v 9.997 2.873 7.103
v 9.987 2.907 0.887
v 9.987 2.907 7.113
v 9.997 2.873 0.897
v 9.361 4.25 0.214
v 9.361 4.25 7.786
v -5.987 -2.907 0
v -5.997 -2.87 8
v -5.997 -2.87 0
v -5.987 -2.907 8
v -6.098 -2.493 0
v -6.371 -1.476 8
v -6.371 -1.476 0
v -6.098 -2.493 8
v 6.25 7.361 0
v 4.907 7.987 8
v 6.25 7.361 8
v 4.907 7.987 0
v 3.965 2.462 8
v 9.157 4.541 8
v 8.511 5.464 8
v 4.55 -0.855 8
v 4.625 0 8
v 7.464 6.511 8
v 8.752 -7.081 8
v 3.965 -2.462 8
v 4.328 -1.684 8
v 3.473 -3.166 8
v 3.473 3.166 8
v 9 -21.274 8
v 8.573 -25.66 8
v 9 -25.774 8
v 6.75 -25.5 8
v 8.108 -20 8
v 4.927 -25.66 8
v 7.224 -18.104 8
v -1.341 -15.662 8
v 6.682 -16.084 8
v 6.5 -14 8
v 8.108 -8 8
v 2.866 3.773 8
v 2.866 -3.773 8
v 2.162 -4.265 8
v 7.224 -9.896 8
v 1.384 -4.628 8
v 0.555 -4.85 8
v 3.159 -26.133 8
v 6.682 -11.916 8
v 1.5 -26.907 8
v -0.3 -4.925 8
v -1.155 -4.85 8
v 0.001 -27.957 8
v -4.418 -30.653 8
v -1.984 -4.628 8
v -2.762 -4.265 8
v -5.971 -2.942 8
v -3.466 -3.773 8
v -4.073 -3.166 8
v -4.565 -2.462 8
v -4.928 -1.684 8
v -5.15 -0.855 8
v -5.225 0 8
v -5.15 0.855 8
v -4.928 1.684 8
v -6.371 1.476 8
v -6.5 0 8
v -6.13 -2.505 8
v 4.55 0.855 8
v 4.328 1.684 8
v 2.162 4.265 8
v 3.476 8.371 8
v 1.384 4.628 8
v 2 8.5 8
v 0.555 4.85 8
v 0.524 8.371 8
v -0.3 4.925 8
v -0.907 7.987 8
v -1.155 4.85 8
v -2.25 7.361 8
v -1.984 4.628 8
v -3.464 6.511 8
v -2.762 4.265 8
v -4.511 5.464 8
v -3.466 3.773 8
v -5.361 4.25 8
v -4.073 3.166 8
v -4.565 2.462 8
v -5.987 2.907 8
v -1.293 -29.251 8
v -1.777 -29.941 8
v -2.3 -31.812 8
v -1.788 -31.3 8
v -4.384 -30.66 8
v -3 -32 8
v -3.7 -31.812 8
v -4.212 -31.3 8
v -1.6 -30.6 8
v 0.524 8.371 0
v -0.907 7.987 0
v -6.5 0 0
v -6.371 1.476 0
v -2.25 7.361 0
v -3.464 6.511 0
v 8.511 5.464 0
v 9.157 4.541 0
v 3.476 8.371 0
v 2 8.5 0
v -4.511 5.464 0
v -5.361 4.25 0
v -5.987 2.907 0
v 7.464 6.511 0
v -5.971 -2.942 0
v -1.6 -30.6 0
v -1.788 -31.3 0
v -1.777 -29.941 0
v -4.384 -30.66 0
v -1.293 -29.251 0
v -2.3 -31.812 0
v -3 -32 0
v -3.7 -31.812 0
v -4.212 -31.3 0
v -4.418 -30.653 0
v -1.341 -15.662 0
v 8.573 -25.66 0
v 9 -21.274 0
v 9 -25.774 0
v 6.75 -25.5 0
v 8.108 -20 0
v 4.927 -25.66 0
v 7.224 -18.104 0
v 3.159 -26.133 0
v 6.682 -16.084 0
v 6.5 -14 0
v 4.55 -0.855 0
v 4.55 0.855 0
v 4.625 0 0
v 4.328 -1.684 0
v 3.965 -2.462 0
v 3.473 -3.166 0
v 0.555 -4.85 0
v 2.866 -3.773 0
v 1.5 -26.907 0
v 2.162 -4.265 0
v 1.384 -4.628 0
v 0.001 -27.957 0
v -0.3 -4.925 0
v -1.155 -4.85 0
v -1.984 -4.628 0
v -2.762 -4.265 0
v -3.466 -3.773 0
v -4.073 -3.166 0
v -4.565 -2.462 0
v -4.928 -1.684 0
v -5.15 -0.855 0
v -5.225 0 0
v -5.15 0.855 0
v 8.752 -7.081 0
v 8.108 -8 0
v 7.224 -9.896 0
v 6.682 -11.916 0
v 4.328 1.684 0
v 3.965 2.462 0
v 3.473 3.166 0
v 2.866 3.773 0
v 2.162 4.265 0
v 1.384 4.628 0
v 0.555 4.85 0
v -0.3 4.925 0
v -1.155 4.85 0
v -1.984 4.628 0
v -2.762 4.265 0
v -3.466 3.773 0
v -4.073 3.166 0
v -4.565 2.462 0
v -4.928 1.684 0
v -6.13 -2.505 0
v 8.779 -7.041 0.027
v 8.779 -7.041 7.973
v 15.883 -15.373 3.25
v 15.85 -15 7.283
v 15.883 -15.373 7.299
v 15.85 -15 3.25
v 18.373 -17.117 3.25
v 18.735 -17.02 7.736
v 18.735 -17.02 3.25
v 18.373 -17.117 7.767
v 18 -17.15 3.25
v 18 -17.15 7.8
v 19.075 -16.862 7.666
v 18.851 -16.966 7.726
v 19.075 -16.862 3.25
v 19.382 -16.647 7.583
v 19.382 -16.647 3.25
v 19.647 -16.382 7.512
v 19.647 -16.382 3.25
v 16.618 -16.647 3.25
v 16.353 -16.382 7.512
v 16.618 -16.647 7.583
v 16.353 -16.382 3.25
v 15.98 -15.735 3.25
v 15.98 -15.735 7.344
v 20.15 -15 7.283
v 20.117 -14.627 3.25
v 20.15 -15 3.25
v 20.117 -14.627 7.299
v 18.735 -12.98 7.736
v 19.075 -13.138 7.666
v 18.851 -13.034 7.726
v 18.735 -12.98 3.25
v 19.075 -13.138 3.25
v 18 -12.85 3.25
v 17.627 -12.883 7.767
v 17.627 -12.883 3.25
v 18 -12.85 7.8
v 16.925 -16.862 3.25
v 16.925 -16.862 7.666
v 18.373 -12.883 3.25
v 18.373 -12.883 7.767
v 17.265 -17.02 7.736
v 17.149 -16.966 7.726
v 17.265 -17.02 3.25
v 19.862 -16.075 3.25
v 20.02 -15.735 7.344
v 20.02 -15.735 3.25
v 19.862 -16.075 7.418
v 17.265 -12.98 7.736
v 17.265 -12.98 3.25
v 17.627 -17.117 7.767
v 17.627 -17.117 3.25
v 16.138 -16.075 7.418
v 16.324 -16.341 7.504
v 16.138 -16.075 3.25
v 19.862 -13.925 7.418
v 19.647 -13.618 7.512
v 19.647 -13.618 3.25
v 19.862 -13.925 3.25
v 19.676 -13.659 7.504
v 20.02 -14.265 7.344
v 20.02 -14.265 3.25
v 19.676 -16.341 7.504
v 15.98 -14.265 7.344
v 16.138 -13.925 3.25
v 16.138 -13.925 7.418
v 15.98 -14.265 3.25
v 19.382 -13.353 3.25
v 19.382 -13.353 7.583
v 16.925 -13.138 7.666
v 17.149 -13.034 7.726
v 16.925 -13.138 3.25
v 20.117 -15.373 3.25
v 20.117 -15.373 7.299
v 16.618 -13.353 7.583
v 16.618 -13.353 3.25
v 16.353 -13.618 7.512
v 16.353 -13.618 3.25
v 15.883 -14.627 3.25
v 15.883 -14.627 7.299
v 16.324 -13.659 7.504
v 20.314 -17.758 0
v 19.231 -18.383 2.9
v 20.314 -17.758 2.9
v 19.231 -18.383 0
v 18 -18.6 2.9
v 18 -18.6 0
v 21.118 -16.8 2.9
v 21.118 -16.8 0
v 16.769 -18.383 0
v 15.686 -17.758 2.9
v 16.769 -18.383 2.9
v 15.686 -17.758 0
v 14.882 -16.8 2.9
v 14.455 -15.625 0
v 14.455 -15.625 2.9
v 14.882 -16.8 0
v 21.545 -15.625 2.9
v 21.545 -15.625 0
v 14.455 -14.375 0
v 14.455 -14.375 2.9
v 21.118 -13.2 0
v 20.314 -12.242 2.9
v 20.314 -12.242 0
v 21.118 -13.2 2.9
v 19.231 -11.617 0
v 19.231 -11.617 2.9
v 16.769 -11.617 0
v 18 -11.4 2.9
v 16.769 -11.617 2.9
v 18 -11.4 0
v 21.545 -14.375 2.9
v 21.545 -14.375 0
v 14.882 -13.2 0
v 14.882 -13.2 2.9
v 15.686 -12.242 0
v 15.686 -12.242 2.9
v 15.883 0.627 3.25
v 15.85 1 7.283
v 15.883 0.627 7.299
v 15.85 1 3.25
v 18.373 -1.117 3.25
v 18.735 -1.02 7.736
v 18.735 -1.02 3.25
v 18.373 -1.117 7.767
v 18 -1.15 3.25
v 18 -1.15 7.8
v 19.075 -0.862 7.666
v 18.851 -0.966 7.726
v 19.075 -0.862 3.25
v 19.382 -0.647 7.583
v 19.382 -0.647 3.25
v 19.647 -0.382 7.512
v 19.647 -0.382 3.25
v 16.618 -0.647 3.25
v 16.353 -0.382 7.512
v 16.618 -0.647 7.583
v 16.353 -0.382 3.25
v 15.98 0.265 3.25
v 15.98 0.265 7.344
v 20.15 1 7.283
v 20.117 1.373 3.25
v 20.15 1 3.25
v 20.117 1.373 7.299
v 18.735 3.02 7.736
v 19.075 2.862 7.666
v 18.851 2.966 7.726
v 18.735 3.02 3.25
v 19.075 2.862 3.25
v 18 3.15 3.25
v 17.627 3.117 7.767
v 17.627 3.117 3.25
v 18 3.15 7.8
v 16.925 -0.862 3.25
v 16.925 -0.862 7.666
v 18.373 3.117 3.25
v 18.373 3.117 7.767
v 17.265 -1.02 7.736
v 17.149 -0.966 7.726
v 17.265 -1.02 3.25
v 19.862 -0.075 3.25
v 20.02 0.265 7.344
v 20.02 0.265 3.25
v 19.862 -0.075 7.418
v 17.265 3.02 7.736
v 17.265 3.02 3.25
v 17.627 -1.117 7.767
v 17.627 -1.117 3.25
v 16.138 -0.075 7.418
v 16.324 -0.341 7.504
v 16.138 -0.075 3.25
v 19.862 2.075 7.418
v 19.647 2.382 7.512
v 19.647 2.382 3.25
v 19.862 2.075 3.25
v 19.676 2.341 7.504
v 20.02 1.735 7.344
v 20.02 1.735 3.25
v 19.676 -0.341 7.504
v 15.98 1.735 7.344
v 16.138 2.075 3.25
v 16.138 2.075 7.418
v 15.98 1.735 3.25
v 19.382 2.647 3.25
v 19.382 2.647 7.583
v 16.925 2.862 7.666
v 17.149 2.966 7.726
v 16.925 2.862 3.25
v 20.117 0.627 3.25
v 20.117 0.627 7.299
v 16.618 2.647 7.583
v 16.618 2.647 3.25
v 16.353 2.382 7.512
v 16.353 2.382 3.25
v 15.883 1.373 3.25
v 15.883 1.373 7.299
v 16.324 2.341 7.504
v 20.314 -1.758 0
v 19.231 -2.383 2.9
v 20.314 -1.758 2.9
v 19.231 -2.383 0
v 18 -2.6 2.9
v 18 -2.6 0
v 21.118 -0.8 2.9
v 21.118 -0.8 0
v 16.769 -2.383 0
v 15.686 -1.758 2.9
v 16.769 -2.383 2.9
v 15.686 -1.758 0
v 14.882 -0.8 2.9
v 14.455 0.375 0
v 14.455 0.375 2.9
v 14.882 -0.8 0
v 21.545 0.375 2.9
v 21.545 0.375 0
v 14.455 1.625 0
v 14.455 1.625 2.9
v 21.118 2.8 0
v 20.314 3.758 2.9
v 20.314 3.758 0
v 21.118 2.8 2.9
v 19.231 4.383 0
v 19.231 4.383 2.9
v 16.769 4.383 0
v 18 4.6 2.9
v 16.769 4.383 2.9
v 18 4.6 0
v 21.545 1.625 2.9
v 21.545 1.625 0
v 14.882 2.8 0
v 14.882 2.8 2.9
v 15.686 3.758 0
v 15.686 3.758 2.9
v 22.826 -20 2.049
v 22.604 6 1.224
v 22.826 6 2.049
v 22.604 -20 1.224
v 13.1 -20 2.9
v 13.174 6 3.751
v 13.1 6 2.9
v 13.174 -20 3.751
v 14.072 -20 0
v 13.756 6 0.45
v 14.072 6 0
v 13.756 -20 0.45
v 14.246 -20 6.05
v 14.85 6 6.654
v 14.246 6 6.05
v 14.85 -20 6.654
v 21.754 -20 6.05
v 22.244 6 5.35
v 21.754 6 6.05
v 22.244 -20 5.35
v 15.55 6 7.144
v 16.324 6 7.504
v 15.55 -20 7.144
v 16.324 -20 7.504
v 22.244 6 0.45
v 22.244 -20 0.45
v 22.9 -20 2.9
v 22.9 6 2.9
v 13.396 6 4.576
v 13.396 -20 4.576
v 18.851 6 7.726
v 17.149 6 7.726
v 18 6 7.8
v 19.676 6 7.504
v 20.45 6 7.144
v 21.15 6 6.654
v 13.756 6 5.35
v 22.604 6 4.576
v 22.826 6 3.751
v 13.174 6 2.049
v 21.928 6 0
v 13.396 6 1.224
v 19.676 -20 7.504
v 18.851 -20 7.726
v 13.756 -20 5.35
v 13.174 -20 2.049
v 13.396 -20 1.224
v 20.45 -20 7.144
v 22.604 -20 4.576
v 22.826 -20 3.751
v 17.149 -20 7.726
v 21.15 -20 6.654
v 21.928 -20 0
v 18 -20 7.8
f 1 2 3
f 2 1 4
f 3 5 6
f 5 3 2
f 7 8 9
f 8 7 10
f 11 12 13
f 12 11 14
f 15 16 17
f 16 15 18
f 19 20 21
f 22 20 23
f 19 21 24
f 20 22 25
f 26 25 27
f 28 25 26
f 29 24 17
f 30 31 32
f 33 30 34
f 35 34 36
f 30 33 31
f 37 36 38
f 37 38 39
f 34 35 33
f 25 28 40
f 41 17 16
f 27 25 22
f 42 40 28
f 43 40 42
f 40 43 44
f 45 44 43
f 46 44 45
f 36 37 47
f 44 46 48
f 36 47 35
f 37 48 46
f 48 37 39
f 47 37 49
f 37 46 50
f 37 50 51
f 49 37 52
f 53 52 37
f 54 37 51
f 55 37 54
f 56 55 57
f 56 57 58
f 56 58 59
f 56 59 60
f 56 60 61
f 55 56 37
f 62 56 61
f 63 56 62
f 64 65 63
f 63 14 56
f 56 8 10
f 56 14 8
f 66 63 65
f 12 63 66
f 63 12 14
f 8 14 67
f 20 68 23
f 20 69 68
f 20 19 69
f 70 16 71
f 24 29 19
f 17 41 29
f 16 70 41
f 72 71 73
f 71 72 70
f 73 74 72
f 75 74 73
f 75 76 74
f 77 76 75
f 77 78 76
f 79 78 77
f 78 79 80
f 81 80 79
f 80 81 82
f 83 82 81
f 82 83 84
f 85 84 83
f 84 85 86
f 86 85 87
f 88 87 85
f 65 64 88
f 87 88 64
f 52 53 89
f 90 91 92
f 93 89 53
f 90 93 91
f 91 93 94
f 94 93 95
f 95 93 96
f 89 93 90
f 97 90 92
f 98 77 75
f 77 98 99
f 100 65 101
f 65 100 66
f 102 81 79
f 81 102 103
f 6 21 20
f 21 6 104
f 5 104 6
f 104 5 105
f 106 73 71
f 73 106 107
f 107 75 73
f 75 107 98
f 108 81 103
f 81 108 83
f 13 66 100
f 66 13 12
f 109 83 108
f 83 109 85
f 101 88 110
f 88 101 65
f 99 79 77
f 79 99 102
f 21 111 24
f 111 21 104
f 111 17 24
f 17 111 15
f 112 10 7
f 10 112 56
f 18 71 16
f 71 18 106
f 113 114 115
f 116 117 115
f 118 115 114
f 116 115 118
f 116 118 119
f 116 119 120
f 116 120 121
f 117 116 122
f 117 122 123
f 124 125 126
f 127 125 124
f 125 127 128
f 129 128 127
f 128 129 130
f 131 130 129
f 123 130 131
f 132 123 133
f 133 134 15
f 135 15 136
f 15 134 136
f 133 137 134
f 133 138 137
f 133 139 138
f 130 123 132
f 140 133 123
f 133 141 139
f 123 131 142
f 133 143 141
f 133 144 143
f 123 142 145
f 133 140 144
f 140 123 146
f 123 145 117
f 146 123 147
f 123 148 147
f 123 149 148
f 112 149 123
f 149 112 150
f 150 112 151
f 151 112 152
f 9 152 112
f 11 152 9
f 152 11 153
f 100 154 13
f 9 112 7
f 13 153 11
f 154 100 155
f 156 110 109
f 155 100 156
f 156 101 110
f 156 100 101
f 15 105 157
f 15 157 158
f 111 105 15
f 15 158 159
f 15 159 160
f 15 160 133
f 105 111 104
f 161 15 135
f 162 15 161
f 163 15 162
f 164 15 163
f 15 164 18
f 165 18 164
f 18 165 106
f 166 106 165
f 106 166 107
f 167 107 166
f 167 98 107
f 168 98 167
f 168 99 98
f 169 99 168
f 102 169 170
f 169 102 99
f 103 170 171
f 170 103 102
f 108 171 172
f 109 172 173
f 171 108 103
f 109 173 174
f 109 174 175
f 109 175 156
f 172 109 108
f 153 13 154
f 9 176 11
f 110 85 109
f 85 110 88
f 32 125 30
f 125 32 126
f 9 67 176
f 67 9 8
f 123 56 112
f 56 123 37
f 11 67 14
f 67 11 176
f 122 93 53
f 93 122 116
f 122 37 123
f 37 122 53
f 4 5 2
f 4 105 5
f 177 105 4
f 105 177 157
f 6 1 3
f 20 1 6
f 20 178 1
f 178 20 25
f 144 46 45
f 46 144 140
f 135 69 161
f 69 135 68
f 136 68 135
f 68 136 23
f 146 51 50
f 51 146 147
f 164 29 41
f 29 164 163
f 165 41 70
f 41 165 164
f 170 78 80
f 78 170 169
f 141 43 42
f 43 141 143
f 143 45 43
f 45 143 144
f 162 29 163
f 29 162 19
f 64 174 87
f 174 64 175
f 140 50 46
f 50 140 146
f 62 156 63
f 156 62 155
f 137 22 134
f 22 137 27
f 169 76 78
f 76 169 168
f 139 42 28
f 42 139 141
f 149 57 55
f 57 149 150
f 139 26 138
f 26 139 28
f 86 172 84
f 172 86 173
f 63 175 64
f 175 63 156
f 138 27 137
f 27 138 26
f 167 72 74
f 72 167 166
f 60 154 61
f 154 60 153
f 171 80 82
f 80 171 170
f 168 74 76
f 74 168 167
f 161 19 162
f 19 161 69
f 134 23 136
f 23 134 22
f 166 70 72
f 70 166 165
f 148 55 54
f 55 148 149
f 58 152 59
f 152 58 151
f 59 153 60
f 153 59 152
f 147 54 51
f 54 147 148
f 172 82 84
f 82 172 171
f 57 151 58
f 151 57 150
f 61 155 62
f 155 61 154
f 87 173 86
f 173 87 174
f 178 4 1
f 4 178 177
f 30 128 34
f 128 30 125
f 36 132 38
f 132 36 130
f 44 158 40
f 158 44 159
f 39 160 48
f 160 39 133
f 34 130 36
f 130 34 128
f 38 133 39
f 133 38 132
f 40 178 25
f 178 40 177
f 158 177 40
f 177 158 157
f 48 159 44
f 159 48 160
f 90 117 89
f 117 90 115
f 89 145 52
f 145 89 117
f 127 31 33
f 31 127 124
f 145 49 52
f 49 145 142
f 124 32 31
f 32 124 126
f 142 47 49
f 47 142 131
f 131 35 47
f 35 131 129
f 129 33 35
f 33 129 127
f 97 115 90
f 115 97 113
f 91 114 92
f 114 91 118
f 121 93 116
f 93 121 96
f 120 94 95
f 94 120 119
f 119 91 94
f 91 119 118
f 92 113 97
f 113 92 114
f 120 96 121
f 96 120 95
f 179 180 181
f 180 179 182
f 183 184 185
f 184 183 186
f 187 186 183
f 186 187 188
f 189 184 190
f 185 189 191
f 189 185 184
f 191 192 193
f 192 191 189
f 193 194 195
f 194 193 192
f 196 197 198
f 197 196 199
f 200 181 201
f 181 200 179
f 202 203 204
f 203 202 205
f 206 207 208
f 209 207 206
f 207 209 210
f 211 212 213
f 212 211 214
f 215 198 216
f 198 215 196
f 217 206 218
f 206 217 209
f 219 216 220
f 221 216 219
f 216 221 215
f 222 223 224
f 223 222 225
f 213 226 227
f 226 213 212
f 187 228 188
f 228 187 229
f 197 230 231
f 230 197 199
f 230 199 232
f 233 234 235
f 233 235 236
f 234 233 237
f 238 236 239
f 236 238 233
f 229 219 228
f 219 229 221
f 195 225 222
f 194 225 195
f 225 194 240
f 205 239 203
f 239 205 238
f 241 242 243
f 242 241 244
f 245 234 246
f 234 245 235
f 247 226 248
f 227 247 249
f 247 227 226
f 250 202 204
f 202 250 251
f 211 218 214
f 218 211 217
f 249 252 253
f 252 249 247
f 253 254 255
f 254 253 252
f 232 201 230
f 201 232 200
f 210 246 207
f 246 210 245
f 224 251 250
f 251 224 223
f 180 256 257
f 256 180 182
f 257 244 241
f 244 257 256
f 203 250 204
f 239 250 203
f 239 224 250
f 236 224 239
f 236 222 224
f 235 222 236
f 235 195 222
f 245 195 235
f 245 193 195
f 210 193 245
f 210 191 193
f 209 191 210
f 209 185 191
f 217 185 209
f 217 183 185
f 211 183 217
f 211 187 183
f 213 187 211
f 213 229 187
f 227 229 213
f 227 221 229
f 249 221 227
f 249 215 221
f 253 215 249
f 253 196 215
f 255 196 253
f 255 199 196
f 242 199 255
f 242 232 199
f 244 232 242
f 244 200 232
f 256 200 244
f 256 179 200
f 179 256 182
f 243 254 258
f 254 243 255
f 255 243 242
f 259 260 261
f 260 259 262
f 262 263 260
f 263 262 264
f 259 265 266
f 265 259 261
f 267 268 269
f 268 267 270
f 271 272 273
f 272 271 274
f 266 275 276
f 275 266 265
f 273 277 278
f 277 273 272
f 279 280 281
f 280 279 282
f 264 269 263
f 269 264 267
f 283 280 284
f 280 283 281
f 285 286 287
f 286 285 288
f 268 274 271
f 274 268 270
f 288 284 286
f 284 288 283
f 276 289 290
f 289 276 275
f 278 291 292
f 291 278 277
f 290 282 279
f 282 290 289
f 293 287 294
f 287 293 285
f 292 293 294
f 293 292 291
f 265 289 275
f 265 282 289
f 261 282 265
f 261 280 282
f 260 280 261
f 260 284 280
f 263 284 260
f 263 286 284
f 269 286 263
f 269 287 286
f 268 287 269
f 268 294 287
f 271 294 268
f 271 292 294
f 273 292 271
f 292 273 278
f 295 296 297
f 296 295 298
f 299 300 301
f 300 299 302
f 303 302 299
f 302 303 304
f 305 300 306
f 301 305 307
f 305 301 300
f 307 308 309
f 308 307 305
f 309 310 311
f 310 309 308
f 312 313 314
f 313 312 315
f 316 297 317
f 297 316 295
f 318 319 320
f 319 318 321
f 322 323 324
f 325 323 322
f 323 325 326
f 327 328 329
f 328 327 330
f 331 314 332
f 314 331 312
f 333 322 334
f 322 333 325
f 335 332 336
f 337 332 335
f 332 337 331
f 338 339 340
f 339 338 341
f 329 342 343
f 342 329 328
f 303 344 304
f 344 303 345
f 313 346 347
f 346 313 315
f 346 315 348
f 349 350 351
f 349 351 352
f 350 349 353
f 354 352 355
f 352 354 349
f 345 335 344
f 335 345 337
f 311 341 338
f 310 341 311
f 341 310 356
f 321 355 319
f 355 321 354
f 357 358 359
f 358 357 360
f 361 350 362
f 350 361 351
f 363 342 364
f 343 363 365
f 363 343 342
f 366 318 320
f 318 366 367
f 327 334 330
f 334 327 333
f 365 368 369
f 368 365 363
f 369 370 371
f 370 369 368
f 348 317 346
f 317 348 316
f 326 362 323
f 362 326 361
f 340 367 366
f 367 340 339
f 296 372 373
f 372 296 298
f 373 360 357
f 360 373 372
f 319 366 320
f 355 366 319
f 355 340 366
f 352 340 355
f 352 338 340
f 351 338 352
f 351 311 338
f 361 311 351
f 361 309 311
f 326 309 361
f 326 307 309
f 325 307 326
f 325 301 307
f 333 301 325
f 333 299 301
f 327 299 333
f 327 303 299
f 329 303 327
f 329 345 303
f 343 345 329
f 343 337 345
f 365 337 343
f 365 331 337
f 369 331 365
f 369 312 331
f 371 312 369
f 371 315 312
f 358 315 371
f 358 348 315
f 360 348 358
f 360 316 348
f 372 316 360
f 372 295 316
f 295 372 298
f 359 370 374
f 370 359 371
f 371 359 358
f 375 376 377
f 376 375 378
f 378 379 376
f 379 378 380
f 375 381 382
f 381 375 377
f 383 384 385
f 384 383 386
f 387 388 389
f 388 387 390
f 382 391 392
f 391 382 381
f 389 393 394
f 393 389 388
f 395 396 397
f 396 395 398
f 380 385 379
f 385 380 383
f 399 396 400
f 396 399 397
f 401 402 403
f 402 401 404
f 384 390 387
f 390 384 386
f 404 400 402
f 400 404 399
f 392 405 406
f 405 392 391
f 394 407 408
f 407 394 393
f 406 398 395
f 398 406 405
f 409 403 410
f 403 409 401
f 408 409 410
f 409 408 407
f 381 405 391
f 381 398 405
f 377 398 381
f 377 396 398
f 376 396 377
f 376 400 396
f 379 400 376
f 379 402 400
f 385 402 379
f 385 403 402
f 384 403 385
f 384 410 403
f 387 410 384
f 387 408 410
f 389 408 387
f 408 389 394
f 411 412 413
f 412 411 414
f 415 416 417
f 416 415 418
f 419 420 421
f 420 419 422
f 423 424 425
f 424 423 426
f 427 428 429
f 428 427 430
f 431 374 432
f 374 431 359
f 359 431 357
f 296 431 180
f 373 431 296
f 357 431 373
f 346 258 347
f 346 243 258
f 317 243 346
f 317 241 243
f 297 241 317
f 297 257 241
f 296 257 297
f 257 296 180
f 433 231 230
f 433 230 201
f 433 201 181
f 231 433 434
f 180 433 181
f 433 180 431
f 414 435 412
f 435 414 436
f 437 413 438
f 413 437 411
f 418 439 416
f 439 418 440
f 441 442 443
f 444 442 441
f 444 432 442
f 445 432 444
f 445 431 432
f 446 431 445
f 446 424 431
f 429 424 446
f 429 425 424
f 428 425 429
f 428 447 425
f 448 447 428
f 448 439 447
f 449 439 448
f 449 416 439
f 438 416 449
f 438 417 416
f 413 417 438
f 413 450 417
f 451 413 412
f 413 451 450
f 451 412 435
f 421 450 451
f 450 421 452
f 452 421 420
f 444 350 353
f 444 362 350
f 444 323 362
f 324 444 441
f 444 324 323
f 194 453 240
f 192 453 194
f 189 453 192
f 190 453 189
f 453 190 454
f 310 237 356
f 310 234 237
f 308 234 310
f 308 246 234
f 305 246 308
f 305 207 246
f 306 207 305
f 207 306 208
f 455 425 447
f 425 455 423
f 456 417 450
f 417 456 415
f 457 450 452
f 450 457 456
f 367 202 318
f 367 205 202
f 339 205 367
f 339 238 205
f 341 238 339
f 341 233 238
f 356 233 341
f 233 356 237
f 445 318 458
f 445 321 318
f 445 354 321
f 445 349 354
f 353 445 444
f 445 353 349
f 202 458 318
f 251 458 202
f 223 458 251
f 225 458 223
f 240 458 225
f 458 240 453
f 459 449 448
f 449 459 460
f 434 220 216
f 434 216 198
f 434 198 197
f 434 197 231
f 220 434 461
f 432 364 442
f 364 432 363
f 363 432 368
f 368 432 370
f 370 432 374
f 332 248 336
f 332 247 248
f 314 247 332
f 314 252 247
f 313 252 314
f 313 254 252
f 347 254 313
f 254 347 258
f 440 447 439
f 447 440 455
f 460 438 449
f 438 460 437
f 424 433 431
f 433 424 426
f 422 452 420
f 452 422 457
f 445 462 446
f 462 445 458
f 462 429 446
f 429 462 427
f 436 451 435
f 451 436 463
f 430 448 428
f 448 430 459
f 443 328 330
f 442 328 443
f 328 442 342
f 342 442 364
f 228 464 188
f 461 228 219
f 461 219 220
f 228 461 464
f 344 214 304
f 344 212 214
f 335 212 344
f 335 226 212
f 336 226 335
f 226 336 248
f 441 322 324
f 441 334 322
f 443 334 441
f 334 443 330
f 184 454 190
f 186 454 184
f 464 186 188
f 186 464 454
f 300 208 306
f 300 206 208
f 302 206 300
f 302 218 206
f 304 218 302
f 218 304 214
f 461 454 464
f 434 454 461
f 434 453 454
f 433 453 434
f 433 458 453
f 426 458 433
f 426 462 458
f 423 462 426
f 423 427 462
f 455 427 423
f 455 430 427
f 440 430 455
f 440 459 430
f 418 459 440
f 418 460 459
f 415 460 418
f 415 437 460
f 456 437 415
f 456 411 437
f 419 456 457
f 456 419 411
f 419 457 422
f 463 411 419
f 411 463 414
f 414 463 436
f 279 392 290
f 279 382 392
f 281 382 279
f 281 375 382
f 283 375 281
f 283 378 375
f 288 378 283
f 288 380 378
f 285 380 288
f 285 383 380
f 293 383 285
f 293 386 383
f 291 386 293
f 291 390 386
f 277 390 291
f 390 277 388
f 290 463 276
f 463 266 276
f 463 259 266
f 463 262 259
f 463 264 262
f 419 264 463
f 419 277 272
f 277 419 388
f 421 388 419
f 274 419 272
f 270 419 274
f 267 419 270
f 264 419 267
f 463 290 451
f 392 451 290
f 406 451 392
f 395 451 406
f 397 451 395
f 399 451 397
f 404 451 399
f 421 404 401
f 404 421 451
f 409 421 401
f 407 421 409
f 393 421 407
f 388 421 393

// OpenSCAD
//
// Fast Release Lever for AJGW Extruder
// (c) 2012 by Alain Mouette - GPL
//
// Derived from: Quick Release Lever for wade
//   by simon litwan, http://www.thingiverse.com/thing:22830
// Licence: Creative Commons: CC BY 3.0 (almost GPL...)


lever();
translate([18,-20,0])rotate([0,90,90]) bar();

layer_thickness=0.25;
$fn=36;
width=8;
extra_width=0.0;// extra on each side in idler fit
inclination=7;//6;
hole=9.55+0.3;
corner=[10,2.9,0];

bar_diameter=9.5+0.3;
bar_radiusr=bar_diameter/2;
bar_length=26;
bar_spring=7+0.2;

module lever(){
	difference(){
		union(){
			translate([2,0,0]) cylinder(r=17/2,h=width);// head
			rotate([0,0,-90]) cube([8.5,10,width]);// body right
			translate([-1,0,0]) rotate([0,0,-90]) cube([28,10,width]);// body right
			translate([-1,-16.6,0]) rotate([0,0,20]) cube([4,15,width]);// body left
			translate([-1,-14,0]) rotate([0,0,-101.6]) cube([17,5,width]);// body left
//			translate([-3.4,-29.8-1,0]) cylinder(r=1,h=width);
		}
		translate([-0.3,0,-0.1]) cylinder(r=hole/2, h=width+0.2);// center hole
		translate([10,2.9,-0.1]) rotate([0,0,-90-inclination]) cube([13,2,width+0.2]);// fit into idler
		translate([18.5,-14,-0.1]) cylinder(r=24/2, h=width+0.2);// bearing space
		translate([6.75,-36,-0.1]) cylinder(r=21/2, h=width+0.2);// finger space
		// 45° sides
		translate(corner+[-1,0,0]) rotate([0,0,-92]) translate([-3,0,0]){
			//cube([16,1,width]);// for viewing only
			translate([-0.1,0,-extra_width-0.1]) rotate([-45,0,0]) cube([16,2,2]);
			translate([-0.1,0,width+extra_width+0.1]) rotate([-45,0,0]) cube([16,2,2]);
		}
  	}
#	translate([-3,-30.6,0]) cylinder(r=1.4, h=width, $fn=12);
}

module bar(){
	difference(){
		translate([-bar_radiusr+2,0,0])cylinder(h=bar_length,r=bar_radiusr);
		translate([0,-bar_radiusr,0])cube([bar_diameter,bar_diameter,bar_length]);
		translate([0,0,5])rotate([0,90,180])m4Screw();
		translate([0,0,bar_length-5])rotate([0,90,180])m4Screw();
	}
}

module m4Screw(h=15) {
	union() {
		translate([0,0,3+layer_thickness])cylinder(h=h+3.3,r=4.3/2);
		translate([0,0,-0.1])cylinder(h=3,r=bar_spring/2,$fn=18);// round for spring
	}
}


// references
//%translate(corner+[-1,0,0]) rotate([0,0,-90]) cube([11.5,1,width]);// idler fit
